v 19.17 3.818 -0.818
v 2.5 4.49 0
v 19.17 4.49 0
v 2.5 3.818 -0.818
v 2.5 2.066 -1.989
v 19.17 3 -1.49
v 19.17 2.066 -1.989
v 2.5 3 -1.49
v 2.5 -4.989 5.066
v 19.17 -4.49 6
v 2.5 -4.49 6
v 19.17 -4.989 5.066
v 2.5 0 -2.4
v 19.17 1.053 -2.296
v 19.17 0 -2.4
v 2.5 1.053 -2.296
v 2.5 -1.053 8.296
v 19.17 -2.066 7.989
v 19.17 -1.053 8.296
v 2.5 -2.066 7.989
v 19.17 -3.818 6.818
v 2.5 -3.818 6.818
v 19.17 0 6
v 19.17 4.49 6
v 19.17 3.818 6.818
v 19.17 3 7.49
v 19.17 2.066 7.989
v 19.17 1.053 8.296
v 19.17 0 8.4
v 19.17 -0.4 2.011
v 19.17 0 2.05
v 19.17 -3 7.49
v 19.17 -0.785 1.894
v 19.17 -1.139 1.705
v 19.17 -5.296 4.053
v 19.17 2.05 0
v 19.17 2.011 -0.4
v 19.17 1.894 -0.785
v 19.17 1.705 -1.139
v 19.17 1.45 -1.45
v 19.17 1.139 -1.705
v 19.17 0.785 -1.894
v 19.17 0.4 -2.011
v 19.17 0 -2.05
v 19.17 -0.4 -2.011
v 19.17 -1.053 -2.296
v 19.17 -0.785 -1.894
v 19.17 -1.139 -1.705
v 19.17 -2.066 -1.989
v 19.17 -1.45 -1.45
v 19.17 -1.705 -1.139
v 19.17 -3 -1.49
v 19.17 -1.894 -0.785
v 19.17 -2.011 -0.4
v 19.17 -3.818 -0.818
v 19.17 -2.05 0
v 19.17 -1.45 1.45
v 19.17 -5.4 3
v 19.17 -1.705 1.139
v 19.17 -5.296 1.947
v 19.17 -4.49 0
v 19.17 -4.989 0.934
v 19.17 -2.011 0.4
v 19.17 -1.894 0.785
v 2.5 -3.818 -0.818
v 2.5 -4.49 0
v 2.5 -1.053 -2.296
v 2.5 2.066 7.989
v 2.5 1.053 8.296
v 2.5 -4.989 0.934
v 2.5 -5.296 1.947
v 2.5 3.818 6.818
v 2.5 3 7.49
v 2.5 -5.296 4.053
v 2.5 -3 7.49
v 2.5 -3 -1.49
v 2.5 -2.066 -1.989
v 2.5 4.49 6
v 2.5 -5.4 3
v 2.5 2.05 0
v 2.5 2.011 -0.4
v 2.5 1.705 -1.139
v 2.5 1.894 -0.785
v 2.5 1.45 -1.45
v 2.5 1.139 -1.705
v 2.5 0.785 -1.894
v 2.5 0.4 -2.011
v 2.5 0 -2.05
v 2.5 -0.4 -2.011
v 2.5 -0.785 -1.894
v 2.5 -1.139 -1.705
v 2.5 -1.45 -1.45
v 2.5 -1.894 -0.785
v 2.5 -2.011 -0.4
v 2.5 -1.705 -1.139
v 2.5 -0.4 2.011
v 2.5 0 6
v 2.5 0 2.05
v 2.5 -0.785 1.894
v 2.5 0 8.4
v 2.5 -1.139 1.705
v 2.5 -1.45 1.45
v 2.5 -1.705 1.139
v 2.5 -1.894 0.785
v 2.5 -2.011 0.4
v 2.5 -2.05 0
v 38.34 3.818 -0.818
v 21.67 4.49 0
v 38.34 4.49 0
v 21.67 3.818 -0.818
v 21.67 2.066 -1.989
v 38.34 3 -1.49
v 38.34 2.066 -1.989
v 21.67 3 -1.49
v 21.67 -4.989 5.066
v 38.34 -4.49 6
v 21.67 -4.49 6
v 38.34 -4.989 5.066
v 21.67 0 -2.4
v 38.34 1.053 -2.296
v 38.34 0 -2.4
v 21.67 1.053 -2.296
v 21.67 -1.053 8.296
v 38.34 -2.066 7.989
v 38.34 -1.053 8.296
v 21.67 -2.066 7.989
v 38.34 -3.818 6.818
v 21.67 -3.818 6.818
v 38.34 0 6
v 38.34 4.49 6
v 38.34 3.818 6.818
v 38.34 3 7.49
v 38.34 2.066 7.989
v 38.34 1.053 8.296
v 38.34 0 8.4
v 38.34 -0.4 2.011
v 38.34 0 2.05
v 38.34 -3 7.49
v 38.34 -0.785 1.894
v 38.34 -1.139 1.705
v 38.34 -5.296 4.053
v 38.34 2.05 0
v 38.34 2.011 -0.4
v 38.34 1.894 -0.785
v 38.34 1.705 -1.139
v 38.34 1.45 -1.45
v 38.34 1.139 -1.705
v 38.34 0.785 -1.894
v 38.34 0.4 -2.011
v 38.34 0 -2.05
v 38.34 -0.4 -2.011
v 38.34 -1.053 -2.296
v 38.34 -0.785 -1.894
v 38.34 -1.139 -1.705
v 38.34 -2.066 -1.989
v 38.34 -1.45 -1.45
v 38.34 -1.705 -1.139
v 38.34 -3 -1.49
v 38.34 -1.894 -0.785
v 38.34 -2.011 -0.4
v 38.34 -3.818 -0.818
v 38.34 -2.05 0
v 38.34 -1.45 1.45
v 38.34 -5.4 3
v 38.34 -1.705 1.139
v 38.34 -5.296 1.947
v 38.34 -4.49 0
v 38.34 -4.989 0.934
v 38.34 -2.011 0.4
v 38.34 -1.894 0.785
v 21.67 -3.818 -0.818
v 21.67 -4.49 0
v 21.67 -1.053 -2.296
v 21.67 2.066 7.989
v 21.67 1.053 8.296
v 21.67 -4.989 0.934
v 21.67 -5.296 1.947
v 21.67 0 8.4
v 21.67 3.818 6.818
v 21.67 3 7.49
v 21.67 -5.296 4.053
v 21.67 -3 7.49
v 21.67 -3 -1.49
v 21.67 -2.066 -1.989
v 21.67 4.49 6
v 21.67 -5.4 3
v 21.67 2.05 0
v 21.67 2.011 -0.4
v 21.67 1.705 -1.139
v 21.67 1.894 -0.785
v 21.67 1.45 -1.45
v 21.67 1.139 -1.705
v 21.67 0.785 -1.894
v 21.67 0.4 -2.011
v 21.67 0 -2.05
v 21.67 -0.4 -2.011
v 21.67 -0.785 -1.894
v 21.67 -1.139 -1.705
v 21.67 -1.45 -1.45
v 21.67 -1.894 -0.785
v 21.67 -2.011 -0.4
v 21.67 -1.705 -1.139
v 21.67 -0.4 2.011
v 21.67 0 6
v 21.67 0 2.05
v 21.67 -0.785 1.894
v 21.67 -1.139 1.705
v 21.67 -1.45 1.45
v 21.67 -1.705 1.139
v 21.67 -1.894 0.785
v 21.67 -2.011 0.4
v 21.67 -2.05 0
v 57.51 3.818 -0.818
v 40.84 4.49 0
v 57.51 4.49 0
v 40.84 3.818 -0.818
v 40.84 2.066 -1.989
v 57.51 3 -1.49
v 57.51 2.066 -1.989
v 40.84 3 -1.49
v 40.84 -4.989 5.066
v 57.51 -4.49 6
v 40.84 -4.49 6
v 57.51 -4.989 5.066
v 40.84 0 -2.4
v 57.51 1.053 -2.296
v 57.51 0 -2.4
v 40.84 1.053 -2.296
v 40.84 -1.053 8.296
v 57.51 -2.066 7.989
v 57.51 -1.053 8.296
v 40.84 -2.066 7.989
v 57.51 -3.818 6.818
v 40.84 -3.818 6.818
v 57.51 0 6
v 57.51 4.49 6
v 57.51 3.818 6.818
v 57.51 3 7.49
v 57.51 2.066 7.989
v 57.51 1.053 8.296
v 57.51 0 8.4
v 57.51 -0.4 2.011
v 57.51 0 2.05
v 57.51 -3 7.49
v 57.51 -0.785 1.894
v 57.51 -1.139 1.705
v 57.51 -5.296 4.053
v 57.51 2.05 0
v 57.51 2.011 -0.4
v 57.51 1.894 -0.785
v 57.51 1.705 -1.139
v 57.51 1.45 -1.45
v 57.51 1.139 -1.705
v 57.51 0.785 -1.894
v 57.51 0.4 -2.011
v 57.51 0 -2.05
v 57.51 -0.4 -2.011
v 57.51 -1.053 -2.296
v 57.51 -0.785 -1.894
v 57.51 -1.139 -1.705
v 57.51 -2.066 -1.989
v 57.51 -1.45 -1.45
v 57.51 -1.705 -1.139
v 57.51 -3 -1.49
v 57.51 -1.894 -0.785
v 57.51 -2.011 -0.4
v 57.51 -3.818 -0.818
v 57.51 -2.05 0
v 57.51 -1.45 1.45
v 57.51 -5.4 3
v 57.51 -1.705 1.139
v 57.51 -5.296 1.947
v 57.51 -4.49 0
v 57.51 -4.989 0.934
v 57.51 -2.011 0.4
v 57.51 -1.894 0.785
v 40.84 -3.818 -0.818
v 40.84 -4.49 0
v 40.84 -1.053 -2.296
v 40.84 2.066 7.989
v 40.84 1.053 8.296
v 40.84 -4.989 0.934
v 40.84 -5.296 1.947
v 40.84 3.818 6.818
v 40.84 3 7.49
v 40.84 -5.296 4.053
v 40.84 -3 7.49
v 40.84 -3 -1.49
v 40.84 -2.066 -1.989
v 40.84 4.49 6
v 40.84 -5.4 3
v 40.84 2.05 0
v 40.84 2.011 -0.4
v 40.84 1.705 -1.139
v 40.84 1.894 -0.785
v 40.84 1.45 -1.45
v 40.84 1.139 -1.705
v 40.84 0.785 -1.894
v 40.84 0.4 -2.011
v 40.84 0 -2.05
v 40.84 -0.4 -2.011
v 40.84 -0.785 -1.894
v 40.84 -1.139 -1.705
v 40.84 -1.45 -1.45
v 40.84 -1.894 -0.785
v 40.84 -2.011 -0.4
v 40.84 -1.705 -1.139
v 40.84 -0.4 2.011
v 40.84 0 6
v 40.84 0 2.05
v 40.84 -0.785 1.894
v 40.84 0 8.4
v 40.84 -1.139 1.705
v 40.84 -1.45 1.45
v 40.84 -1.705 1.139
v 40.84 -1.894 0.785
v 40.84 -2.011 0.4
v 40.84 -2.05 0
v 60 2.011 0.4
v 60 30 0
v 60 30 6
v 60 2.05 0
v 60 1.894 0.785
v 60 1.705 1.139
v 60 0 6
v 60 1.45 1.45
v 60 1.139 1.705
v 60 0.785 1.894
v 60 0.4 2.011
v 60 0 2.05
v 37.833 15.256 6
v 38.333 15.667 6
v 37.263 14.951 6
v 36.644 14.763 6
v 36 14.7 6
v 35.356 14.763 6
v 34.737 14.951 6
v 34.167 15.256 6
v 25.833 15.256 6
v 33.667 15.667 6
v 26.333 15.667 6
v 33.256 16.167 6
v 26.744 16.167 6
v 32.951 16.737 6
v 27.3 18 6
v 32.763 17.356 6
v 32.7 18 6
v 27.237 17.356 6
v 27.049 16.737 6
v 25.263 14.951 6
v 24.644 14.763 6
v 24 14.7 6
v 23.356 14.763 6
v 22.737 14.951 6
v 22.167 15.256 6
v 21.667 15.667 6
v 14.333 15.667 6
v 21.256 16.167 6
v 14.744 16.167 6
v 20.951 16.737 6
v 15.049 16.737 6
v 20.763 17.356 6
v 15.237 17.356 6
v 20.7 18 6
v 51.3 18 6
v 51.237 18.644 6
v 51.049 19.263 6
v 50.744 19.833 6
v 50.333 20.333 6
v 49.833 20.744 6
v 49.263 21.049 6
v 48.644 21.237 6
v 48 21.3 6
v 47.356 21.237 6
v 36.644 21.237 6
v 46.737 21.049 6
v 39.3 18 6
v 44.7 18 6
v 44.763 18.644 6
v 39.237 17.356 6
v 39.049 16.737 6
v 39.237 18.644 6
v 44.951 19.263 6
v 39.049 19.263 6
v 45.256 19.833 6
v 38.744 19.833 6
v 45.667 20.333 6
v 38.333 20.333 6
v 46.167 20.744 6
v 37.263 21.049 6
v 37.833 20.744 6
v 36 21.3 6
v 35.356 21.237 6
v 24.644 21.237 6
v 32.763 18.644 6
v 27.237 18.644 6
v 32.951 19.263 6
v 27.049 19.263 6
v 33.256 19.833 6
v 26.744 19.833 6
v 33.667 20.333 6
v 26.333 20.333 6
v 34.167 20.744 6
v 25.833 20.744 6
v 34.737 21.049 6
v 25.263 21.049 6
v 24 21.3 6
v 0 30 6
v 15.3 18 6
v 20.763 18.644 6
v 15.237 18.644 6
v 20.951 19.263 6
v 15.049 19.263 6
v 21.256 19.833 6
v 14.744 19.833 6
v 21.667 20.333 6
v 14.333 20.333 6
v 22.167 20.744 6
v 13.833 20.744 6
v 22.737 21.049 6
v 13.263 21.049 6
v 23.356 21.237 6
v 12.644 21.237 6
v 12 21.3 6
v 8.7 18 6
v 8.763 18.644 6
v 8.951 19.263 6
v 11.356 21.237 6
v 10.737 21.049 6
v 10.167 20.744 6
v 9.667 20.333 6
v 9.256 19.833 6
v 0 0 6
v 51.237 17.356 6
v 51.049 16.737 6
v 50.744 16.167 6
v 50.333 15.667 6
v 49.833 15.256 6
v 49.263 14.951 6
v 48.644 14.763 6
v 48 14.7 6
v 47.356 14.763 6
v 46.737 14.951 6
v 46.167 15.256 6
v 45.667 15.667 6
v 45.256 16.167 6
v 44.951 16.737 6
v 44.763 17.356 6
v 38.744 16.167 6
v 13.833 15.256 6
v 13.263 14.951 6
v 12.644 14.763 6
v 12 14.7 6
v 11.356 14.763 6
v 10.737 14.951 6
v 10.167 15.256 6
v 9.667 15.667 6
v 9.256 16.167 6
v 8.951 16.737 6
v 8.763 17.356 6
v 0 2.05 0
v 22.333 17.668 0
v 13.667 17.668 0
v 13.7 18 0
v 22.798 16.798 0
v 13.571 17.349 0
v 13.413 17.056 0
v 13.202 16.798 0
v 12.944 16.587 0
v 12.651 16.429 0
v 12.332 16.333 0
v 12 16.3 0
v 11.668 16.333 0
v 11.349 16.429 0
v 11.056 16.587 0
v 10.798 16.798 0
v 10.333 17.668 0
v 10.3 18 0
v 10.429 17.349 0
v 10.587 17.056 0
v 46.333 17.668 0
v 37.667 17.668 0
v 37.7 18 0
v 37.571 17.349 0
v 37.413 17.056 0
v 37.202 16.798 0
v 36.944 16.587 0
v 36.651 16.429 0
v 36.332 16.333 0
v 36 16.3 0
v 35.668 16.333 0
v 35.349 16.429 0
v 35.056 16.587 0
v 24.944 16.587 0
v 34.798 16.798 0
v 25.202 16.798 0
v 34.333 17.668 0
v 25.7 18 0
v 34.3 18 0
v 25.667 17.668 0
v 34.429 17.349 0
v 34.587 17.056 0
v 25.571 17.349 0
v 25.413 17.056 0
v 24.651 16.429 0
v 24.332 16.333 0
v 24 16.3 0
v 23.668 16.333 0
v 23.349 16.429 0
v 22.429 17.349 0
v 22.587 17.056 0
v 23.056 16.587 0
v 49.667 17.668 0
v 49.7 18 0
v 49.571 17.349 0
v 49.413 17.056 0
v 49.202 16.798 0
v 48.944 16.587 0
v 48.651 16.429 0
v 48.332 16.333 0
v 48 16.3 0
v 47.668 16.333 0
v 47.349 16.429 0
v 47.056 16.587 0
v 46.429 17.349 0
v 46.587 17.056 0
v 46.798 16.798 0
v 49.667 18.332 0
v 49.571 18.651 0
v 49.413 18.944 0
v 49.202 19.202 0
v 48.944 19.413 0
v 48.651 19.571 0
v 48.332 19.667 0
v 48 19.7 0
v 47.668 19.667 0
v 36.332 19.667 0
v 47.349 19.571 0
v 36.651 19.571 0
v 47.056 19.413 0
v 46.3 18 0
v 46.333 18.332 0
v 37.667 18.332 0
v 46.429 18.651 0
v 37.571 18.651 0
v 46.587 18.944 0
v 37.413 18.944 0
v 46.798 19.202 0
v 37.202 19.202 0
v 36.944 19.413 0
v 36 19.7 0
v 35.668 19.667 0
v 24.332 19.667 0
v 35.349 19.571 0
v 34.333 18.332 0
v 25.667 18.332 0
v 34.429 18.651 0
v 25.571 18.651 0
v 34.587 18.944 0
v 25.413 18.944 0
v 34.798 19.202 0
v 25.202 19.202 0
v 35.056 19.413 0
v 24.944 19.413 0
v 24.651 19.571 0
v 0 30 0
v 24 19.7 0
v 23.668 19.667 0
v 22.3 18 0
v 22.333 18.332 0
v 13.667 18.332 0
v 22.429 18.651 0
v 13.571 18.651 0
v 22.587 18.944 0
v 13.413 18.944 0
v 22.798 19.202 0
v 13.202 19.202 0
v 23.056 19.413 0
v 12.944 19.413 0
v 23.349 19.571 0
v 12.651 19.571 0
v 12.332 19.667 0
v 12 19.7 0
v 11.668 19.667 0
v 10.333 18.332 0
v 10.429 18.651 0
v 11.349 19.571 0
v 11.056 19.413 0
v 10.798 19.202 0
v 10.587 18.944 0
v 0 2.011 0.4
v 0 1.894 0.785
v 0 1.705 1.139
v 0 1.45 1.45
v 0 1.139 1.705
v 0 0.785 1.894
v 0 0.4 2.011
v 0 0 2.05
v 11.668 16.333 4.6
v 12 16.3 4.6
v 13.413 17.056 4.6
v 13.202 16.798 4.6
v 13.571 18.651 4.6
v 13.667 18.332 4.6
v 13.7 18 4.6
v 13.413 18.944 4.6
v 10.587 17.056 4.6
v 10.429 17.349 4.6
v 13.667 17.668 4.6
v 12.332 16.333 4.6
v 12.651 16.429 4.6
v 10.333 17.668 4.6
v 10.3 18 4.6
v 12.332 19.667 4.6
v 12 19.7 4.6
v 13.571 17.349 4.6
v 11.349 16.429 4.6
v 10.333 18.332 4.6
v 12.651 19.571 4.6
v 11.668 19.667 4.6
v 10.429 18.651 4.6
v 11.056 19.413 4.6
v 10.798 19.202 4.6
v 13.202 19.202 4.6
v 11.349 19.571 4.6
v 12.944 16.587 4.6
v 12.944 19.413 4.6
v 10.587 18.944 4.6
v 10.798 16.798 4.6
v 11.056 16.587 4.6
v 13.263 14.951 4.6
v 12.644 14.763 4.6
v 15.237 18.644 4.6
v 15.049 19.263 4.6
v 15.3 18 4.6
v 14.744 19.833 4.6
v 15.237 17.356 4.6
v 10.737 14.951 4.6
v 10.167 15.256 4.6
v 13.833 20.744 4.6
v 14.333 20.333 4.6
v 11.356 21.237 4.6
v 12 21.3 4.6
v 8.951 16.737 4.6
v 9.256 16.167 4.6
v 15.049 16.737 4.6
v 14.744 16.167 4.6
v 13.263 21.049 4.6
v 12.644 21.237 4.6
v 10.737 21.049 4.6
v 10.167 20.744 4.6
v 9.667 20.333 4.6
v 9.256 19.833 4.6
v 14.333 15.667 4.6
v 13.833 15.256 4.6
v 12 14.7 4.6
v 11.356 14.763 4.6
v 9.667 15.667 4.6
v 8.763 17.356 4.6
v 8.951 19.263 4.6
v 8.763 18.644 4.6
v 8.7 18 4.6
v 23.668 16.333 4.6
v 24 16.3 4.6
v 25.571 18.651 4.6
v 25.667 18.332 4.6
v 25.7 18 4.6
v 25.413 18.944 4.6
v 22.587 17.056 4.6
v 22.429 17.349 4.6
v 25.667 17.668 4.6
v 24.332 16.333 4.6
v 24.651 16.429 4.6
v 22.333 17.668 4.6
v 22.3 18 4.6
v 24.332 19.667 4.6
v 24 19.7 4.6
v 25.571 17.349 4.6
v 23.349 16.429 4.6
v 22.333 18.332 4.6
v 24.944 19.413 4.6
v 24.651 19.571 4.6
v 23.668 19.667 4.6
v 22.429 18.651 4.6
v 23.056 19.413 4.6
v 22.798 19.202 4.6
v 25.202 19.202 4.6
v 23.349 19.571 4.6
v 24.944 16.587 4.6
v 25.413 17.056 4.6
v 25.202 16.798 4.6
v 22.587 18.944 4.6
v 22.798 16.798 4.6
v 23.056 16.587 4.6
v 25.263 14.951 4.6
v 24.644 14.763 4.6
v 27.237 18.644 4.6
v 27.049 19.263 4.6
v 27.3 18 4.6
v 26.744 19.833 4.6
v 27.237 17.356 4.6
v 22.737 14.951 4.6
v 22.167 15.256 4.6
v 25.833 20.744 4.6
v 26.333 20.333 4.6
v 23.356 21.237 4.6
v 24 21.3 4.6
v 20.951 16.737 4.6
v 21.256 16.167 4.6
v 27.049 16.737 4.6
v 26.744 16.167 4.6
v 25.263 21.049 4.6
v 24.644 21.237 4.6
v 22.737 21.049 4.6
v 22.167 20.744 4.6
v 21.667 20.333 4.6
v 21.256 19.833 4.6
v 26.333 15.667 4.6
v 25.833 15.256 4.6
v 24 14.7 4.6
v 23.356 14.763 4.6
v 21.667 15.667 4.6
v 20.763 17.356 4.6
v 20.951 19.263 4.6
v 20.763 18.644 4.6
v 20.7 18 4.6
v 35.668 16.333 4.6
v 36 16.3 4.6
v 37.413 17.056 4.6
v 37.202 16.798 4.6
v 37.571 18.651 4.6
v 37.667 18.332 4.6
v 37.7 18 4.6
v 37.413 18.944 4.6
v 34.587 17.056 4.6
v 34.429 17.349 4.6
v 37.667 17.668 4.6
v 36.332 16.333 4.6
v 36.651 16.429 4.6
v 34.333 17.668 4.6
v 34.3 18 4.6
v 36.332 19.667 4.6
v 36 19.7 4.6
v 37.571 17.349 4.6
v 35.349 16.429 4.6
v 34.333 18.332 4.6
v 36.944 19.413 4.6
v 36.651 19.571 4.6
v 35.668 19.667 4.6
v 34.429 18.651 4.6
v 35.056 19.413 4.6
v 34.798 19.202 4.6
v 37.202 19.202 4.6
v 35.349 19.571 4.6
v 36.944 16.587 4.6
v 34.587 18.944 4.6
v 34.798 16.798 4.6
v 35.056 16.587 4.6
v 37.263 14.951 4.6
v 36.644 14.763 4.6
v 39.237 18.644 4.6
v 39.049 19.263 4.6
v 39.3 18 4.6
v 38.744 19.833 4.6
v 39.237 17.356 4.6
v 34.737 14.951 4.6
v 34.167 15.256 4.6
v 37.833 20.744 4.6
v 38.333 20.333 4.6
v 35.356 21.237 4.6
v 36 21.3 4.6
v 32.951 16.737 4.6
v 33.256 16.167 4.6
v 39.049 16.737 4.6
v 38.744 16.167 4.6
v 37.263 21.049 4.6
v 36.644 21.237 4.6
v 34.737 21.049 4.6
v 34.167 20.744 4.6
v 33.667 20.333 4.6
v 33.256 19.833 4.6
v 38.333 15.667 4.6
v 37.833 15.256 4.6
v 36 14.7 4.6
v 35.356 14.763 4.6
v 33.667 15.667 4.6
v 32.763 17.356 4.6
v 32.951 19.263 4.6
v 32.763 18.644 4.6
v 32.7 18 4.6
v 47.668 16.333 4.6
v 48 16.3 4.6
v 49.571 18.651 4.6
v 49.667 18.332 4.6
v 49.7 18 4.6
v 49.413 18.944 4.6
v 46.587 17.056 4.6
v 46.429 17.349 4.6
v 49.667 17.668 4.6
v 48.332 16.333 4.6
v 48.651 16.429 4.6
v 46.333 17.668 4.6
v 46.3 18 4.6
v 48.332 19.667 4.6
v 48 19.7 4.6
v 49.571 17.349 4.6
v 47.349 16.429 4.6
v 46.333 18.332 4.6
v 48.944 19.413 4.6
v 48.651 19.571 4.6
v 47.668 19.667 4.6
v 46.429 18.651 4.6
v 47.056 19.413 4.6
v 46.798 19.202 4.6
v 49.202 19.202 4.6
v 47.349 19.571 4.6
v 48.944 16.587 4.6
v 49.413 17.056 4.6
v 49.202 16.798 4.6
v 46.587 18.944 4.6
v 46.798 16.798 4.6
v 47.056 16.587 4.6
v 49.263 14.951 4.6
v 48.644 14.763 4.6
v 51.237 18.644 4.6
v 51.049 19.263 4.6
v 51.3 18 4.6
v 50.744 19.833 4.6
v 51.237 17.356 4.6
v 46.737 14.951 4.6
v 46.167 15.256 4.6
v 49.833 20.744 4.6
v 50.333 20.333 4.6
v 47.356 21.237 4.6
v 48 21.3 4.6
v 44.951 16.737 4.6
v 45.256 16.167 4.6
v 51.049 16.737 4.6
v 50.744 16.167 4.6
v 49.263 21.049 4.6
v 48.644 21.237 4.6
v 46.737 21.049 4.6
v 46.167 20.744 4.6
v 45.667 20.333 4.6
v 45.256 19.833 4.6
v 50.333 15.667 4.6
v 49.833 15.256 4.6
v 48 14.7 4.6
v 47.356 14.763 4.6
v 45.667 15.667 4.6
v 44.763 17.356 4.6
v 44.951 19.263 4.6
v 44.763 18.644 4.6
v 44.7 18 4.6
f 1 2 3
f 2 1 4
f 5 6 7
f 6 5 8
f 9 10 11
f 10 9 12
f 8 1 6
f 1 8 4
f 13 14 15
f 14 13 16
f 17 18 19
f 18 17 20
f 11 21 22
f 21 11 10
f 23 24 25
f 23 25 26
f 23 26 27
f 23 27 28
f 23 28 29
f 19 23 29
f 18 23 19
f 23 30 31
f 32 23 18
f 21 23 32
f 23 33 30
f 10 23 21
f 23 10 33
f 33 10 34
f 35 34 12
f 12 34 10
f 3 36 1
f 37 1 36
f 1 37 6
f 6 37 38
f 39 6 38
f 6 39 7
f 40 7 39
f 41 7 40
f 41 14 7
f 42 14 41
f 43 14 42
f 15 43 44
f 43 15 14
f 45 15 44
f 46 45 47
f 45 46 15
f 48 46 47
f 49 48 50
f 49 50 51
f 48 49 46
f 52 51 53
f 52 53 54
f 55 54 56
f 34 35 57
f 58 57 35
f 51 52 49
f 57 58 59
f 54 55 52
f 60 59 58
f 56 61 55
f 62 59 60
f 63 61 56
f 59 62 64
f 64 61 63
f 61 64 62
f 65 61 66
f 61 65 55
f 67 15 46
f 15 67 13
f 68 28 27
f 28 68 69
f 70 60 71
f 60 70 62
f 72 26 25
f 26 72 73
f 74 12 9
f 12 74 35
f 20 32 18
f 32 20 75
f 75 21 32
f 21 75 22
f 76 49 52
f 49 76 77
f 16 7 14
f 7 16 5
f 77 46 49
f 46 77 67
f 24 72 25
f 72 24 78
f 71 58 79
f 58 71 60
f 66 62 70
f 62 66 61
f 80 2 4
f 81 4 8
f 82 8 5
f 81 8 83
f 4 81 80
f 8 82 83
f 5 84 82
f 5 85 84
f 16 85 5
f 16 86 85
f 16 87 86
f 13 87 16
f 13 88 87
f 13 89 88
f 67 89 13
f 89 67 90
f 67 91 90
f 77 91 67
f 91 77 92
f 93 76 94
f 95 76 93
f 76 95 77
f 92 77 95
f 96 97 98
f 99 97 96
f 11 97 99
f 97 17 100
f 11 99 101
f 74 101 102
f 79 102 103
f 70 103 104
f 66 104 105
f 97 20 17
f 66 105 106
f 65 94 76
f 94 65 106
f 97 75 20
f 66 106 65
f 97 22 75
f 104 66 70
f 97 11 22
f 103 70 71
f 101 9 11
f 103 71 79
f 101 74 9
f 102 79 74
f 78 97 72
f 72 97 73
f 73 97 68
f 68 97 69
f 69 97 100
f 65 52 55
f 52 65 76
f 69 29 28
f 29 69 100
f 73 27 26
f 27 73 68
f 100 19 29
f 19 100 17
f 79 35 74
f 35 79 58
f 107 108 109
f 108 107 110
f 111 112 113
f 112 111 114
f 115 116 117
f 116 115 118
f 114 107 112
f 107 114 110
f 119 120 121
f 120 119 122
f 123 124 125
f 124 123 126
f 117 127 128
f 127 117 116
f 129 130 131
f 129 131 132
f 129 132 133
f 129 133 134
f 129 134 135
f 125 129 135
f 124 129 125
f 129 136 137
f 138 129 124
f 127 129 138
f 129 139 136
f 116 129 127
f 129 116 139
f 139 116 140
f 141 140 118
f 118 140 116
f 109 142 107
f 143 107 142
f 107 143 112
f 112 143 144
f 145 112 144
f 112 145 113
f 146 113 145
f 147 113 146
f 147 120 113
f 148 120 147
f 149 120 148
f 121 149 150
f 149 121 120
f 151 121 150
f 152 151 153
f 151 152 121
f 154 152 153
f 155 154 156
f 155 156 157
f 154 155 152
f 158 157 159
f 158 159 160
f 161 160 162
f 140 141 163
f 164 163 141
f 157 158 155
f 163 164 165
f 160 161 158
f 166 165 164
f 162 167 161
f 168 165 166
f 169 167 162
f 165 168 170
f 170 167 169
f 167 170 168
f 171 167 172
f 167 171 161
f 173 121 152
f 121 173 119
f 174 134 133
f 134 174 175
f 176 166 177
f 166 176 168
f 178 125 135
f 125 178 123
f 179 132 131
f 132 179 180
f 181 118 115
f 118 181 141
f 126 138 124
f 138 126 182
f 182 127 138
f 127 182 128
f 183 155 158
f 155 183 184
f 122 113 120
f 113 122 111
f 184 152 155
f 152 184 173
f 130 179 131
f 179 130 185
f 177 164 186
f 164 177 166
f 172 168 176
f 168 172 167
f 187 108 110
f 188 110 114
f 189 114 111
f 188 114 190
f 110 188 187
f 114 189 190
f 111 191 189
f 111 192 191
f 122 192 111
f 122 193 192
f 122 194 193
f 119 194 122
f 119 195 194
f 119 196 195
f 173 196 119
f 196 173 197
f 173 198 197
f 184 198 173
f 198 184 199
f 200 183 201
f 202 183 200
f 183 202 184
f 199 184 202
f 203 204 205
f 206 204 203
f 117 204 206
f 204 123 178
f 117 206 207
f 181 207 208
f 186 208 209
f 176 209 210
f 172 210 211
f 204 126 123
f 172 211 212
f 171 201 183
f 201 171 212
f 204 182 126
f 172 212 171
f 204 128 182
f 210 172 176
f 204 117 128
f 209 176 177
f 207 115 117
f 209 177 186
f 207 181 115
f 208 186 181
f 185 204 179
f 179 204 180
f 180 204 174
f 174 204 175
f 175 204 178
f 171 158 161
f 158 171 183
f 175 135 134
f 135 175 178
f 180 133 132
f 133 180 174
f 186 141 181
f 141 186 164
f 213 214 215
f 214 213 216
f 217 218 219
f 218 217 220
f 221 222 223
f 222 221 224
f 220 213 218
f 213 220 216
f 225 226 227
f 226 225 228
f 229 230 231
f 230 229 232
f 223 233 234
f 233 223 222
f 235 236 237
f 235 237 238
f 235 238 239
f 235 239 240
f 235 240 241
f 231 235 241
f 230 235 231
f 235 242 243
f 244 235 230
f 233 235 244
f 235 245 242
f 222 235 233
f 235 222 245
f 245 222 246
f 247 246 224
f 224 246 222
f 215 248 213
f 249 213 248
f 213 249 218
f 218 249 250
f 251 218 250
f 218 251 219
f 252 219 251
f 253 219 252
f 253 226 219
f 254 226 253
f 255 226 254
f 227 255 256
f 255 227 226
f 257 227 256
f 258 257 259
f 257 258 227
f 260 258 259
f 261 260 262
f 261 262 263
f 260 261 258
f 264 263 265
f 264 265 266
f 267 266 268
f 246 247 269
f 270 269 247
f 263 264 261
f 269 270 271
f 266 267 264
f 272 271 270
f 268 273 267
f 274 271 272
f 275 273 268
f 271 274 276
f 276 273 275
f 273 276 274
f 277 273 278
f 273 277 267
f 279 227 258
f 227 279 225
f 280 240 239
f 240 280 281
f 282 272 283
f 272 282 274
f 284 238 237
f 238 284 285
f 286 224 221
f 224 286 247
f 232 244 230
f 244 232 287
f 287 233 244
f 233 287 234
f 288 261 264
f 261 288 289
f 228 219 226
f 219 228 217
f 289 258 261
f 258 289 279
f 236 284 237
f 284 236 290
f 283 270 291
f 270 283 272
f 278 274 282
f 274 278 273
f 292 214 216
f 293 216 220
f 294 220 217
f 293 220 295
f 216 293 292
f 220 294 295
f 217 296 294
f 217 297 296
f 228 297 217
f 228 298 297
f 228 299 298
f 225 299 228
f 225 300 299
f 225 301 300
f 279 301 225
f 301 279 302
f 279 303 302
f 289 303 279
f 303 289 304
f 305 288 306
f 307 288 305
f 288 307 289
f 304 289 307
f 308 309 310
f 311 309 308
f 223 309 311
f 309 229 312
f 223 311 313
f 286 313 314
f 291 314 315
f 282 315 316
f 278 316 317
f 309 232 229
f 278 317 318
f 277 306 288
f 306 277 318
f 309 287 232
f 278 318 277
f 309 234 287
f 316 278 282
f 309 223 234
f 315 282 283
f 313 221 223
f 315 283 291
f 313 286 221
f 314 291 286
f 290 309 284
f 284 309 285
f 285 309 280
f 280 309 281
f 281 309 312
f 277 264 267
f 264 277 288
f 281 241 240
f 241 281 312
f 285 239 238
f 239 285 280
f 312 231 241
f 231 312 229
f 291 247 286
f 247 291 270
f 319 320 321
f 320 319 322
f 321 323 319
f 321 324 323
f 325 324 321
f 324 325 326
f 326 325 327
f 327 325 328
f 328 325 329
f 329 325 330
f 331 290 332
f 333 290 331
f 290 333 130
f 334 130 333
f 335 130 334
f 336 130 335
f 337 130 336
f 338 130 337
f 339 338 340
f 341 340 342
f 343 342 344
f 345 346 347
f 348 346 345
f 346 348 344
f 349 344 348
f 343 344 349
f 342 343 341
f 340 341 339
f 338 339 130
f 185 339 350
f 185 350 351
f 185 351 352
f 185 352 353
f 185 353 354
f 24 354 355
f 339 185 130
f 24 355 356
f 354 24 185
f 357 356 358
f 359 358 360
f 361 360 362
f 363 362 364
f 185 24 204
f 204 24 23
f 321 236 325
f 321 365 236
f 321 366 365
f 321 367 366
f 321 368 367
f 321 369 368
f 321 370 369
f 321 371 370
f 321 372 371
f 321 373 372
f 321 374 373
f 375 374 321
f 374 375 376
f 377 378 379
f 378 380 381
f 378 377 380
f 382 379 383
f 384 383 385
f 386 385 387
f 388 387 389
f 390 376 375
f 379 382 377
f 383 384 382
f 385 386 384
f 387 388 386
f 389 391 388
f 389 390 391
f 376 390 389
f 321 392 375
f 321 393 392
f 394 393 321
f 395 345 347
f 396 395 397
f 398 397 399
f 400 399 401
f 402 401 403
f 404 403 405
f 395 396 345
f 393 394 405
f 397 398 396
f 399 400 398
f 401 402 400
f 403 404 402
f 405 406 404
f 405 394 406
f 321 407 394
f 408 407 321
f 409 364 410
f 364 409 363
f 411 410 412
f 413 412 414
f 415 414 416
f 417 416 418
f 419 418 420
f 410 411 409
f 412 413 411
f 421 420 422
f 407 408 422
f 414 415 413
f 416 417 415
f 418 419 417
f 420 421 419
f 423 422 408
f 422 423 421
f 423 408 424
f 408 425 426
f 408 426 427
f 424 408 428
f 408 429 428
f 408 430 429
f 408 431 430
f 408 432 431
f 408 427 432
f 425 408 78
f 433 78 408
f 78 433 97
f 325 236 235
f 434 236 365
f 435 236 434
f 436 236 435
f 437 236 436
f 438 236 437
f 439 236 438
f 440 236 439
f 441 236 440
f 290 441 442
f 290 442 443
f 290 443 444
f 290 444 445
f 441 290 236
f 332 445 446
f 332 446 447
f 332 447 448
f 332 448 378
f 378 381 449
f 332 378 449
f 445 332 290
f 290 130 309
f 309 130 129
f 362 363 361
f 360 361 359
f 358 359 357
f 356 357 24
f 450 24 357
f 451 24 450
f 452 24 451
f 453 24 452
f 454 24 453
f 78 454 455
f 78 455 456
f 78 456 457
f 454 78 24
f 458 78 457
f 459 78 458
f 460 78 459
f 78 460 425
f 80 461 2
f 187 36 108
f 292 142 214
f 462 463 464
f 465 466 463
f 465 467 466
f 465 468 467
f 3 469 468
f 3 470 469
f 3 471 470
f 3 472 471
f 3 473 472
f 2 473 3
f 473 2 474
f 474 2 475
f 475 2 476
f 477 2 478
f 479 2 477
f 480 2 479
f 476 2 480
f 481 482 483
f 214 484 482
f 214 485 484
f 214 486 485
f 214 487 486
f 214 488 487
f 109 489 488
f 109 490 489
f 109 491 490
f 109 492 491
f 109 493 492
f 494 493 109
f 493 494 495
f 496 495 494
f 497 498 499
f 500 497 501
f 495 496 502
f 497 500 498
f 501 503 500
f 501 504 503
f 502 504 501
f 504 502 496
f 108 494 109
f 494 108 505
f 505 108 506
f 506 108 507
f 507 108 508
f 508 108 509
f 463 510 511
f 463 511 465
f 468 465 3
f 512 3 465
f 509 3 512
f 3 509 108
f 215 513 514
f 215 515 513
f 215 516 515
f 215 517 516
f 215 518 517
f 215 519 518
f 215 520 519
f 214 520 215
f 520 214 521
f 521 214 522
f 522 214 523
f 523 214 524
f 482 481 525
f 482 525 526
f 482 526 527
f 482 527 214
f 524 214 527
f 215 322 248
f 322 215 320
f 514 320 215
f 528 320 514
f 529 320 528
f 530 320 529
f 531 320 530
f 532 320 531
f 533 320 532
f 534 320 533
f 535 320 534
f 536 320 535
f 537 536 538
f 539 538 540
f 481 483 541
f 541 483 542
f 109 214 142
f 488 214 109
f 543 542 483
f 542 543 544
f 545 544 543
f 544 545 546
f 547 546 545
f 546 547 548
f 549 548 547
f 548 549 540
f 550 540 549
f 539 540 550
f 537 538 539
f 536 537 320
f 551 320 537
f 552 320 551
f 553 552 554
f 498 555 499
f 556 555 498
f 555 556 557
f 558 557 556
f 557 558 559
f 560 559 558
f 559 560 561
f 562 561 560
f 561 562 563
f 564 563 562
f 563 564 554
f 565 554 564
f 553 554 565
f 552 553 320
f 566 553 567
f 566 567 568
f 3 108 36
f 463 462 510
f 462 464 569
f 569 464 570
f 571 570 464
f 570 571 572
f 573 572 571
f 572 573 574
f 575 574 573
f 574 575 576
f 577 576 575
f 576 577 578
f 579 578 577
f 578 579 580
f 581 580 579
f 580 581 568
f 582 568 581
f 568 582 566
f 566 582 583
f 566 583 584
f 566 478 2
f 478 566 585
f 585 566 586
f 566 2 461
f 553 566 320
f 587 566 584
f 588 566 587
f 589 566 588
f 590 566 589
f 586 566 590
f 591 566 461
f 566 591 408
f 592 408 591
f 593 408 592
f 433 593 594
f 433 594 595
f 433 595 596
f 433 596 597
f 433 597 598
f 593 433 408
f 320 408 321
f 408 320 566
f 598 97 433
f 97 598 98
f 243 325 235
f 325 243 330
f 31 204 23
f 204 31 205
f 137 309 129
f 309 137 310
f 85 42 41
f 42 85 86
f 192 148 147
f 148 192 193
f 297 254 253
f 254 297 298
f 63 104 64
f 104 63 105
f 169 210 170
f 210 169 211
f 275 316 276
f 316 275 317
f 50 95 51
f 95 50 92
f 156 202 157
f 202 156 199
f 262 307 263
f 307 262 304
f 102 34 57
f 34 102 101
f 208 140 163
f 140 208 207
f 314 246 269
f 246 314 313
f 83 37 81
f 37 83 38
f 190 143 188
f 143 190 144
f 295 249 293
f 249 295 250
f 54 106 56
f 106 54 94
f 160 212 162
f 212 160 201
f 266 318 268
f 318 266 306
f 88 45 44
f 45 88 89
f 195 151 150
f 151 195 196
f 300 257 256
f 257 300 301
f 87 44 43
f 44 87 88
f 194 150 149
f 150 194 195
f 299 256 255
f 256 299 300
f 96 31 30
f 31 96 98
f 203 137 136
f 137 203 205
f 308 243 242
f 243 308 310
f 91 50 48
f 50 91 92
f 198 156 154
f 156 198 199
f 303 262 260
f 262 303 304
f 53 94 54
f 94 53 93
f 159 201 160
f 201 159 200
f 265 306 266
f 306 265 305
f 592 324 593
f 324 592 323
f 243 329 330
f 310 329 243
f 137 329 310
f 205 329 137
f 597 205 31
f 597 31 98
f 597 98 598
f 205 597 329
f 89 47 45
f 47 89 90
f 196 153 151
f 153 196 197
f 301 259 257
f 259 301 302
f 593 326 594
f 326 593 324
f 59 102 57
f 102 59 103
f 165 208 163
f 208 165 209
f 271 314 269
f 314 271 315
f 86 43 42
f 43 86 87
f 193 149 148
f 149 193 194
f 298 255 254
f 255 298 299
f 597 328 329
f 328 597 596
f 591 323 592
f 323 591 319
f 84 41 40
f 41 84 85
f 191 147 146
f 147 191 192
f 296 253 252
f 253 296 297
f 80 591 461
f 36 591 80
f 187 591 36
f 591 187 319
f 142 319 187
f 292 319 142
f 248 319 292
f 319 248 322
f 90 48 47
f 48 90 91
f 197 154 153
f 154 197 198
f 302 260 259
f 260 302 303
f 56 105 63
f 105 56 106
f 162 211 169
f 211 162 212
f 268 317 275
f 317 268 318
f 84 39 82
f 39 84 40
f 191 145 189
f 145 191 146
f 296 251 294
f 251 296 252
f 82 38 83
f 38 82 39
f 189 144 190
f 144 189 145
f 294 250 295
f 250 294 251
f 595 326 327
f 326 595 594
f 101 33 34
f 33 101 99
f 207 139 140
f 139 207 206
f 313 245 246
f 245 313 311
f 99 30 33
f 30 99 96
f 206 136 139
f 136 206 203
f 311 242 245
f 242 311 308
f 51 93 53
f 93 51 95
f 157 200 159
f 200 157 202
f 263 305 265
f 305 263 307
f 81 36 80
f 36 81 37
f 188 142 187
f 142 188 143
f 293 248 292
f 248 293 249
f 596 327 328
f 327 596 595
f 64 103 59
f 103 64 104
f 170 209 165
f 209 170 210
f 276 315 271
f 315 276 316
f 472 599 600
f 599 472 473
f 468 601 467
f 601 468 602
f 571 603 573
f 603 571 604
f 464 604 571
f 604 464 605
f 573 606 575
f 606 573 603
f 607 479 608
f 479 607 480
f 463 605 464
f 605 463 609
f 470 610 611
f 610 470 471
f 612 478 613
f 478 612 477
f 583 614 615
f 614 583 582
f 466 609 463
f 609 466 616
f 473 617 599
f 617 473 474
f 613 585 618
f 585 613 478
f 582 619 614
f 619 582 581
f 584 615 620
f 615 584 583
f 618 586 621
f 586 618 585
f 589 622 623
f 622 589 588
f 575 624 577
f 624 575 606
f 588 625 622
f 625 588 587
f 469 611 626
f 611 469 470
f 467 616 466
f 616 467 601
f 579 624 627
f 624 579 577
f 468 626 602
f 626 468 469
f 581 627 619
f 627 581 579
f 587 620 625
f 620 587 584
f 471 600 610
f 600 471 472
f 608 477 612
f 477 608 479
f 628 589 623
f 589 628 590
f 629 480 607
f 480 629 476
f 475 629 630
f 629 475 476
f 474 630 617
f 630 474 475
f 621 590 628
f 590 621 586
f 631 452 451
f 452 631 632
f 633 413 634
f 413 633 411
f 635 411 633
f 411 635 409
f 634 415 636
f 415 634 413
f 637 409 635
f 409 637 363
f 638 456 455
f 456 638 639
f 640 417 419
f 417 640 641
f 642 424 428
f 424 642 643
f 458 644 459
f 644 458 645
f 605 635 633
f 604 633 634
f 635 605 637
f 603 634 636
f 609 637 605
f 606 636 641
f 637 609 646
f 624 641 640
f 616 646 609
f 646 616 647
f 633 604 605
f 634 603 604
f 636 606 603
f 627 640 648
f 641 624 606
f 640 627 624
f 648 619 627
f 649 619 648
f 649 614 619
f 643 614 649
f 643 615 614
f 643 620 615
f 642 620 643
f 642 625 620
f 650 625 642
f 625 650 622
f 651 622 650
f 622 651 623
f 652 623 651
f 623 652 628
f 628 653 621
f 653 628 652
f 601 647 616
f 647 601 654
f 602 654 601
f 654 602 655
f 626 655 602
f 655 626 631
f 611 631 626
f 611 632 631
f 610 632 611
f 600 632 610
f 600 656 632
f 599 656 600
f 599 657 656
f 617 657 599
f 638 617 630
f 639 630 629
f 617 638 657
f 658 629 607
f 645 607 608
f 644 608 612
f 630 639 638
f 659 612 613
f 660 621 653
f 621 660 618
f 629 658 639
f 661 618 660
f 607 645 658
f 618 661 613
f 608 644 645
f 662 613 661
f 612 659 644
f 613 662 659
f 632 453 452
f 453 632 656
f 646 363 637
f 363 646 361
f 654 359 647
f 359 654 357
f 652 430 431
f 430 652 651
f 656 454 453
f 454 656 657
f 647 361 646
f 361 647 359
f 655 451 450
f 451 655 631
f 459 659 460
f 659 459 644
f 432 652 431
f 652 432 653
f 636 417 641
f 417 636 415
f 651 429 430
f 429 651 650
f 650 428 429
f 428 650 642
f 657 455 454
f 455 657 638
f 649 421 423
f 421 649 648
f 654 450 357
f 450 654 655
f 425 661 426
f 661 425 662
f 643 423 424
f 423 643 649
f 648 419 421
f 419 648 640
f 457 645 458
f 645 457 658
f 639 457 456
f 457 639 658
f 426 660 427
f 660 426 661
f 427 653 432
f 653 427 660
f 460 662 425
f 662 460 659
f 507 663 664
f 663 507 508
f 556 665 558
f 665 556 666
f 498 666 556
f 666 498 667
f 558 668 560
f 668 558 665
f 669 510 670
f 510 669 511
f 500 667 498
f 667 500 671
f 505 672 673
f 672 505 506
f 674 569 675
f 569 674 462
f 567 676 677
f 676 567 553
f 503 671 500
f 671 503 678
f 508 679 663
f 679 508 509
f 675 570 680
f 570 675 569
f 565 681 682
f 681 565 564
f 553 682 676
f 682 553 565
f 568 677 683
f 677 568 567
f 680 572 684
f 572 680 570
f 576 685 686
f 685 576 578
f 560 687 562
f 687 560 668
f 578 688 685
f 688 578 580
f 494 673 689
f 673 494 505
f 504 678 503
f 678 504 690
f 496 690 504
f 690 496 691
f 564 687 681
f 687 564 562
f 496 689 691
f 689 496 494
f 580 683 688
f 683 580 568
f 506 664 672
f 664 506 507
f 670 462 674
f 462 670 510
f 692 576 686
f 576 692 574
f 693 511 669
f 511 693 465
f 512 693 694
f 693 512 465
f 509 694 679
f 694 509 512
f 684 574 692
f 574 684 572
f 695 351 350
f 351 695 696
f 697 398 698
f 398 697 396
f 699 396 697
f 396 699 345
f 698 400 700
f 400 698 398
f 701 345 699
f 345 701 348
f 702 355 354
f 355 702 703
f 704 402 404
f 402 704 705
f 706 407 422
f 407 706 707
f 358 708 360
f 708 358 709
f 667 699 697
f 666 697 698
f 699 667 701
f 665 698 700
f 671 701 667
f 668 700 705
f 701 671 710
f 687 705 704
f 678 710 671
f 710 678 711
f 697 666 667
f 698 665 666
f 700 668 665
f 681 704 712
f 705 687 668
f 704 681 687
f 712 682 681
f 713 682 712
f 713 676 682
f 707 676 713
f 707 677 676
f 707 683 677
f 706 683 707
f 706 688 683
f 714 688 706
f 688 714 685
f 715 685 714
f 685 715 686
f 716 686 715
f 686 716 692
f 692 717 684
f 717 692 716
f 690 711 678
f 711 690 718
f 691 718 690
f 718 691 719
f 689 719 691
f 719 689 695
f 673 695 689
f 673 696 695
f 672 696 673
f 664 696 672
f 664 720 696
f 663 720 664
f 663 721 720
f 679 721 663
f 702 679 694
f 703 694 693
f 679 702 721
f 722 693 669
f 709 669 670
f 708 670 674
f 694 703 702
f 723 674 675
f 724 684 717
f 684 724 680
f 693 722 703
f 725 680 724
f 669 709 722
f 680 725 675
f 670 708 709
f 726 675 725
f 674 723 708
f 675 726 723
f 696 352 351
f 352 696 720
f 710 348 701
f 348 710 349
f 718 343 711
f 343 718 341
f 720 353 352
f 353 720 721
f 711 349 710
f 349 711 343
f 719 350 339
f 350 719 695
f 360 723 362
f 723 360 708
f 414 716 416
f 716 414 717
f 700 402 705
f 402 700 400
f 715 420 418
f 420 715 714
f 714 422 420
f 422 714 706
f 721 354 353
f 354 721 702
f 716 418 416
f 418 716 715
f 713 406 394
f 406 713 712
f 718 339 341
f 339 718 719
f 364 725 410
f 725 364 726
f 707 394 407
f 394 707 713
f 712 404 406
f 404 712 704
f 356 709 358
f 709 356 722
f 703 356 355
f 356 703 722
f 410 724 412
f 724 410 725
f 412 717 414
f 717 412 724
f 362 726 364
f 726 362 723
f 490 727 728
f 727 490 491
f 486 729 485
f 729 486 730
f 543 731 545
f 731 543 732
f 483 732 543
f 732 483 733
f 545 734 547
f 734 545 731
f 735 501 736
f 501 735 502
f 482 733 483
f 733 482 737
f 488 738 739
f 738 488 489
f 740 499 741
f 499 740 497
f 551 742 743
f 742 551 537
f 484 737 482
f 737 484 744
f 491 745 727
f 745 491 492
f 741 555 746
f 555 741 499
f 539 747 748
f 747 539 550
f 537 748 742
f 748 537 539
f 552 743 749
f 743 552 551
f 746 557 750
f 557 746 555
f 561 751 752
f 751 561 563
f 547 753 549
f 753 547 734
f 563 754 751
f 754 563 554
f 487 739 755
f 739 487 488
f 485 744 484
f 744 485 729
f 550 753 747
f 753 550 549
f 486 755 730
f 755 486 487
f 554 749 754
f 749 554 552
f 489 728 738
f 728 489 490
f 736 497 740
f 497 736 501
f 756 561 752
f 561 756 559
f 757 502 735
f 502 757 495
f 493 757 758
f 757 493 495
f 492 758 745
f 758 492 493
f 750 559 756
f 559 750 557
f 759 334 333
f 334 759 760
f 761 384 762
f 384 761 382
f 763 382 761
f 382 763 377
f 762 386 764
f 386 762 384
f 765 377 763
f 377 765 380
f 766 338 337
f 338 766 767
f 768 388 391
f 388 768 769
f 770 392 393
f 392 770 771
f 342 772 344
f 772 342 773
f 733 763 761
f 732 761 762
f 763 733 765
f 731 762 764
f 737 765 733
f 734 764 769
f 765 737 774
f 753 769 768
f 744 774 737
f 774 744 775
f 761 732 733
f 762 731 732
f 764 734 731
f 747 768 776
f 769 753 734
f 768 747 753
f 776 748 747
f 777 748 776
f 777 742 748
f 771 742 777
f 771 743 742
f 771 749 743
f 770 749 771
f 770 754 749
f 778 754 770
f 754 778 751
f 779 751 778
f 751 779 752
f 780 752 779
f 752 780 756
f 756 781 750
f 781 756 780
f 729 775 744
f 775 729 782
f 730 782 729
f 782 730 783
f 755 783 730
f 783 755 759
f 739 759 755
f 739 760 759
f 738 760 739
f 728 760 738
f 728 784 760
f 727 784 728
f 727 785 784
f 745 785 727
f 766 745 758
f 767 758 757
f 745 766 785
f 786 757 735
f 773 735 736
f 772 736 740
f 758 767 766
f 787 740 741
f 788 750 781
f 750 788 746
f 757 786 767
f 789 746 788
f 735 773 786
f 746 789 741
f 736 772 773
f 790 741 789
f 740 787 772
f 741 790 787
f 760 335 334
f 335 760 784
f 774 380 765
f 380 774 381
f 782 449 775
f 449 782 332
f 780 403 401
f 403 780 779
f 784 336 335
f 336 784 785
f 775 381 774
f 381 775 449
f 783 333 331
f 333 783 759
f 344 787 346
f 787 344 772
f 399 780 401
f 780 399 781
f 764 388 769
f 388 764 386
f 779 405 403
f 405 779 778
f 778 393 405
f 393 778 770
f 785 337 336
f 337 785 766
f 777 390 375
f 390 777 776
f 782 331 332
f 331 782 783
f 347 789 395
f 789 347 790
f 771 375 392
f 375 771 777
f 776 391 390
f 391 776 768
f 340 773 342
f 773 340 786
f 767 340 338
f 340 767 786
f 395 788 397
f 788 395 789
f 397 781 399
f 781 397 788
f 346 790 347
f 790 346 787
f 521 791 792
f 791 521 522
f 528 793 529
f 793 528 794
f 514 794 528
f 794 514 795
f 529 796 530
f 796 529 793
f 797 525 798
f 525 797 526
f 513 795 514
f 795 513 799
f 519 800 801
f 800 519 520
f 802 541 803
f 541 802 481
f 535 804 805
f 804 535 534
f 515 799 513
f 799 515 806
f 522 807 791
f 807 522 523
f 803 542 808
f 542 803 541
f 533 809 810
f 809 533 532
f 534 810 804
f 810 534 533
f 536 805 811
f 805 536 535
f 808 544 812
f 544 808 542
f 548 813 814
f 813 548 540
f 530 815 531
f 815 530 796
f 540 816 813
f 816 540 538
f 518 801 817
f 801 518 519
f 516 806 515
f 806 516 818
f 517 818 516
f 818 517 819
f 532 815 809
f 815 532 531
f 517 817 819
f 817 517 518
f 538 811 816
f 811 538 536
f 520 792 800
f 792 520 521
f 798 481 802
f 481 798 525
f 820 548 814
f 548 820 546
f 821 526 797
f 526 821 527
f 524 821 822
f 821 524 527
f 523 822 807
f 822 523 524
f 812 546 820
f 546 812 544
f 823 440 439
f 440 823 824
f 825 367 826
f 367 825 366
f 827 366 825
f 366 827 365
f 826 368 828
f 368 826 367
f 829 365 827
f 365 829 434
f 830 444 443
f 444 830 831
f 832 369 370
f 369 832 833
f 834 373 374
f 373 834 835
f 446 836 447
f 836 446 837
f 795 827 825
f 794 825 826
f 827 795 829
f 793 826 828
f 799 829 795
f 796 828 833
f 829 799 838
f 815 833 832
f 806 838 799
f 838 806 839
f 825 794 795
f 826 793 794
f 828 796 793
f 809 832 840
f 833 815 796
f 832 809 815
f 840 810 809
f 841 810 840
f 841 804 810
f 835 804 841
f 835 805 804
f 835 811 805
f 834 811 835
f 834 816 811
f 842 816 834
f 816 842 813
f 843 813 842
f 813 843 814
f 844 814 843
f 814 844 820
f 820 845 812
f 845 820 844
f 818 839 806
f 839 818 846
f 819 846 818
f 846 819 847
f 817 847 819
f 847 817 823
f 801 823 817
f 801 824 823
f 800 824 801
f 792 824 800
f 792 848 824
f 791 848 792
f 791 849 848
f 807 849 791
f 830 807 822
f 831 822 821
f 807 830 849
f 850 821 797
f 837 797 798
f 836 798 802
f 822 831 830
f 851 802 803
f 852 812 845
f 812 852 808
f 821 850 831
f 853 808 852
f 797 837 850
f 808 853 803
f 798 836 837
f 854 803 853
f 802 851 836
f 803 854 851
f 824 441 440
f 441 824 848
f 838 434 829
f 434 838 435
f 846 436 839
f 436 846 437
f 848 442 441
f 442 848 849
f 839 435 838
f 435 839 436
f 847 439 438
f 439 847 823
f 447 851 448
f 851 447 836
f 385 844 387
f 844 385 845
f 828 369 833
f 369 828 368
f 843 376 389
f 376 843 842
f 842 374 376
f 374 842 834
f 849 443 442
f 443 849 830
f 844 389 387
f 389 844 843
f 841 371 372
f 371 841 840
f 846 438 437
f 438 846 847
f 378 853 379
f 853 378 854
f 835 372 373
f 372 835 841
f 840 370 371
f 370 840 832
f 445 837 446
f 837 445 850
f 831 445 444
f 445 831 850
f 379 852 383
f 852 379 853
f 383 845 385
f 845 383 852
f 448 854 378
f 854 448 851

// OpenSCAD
$fn = 32;

// ----------------------------------------------------------------------
// Hinge leaf: 60 x 35.4 x 10.8 mm
// ----------------------------------------------------------------------

// --- parameters (mm) ---
leaf_len = 60;            // leaf length, X
leaf_w = 30;              // leaf width, Y
leaf_t = 6;               // leaf thickness
knuckle_d = 10.8;         // knuckle diameter
knuckle_w = 16.67;        // knuckle width
knuckle_n = 3;            // number of knuckles
pin_d = 4.1;              // pin bore
gap = 2.5;                // gap between the knuckles
screw_d = 3.4;            // screw clearance
cs_d = 6.6;               // countersink diameter
cs_h = 1.4;               // countersink depth

module leaf() {
  cube([leaf_len, leaf_w, leaf_t]);
}

module knuckles() {
  /* barrels sit on the leaf edge, the pin axis at half the leaf thickness */
  for (i = [0 : knuckle_n - 1])
    translate([gap + i * (knuckle_w + gap), 0, leaf_t * 0.5])
      rotate([0, 90, 0]) cylinder(h = knuckle_w, d = knuckle_d);
}

difference() {
  union() {
    leaf();
    knuckles();
  }
  rotate([0, 90, 0]) translate([0, 0, -1])
    cylinder(h = leaf_len + 2, d = pin_d);
  translate([12, leaf_w * 0.6, -1]) cylinder(h = leaf_t + 2, d = screw_d);
  translate([12, leaf_w * 0.6, leaf_t - cs_h]) cylinder(h = cs_h + 0.5, d = cs_d);
  translate([24, leaf_w * 0.6, -1]) cylinder(h = leaf_t + 2, d = screw_d);
  translate([24, leaf_w * 0.6, leaf_t - cs_h]) cylinder(h = cs_h + 0.5, d = cs_d);
  translate([36, leaf_w * 0.6, -1]) cylinder(h = leaf_t + 2, d = screw_d);
  translate([36, leaf_w * 0.6, leaf_t - cs_h]) cylinder(h = cs_h + 0.5, d = cs_d);
  translate([48, leaf_w * 0.6, -1]) cylinder(h = leaf_t + 2, d = screw_d);
  translate([48, leaf_w * 0.6, leaf_t - cs_h]) cylinder(h = cs_h + 0.5, d = cs_d);
}
